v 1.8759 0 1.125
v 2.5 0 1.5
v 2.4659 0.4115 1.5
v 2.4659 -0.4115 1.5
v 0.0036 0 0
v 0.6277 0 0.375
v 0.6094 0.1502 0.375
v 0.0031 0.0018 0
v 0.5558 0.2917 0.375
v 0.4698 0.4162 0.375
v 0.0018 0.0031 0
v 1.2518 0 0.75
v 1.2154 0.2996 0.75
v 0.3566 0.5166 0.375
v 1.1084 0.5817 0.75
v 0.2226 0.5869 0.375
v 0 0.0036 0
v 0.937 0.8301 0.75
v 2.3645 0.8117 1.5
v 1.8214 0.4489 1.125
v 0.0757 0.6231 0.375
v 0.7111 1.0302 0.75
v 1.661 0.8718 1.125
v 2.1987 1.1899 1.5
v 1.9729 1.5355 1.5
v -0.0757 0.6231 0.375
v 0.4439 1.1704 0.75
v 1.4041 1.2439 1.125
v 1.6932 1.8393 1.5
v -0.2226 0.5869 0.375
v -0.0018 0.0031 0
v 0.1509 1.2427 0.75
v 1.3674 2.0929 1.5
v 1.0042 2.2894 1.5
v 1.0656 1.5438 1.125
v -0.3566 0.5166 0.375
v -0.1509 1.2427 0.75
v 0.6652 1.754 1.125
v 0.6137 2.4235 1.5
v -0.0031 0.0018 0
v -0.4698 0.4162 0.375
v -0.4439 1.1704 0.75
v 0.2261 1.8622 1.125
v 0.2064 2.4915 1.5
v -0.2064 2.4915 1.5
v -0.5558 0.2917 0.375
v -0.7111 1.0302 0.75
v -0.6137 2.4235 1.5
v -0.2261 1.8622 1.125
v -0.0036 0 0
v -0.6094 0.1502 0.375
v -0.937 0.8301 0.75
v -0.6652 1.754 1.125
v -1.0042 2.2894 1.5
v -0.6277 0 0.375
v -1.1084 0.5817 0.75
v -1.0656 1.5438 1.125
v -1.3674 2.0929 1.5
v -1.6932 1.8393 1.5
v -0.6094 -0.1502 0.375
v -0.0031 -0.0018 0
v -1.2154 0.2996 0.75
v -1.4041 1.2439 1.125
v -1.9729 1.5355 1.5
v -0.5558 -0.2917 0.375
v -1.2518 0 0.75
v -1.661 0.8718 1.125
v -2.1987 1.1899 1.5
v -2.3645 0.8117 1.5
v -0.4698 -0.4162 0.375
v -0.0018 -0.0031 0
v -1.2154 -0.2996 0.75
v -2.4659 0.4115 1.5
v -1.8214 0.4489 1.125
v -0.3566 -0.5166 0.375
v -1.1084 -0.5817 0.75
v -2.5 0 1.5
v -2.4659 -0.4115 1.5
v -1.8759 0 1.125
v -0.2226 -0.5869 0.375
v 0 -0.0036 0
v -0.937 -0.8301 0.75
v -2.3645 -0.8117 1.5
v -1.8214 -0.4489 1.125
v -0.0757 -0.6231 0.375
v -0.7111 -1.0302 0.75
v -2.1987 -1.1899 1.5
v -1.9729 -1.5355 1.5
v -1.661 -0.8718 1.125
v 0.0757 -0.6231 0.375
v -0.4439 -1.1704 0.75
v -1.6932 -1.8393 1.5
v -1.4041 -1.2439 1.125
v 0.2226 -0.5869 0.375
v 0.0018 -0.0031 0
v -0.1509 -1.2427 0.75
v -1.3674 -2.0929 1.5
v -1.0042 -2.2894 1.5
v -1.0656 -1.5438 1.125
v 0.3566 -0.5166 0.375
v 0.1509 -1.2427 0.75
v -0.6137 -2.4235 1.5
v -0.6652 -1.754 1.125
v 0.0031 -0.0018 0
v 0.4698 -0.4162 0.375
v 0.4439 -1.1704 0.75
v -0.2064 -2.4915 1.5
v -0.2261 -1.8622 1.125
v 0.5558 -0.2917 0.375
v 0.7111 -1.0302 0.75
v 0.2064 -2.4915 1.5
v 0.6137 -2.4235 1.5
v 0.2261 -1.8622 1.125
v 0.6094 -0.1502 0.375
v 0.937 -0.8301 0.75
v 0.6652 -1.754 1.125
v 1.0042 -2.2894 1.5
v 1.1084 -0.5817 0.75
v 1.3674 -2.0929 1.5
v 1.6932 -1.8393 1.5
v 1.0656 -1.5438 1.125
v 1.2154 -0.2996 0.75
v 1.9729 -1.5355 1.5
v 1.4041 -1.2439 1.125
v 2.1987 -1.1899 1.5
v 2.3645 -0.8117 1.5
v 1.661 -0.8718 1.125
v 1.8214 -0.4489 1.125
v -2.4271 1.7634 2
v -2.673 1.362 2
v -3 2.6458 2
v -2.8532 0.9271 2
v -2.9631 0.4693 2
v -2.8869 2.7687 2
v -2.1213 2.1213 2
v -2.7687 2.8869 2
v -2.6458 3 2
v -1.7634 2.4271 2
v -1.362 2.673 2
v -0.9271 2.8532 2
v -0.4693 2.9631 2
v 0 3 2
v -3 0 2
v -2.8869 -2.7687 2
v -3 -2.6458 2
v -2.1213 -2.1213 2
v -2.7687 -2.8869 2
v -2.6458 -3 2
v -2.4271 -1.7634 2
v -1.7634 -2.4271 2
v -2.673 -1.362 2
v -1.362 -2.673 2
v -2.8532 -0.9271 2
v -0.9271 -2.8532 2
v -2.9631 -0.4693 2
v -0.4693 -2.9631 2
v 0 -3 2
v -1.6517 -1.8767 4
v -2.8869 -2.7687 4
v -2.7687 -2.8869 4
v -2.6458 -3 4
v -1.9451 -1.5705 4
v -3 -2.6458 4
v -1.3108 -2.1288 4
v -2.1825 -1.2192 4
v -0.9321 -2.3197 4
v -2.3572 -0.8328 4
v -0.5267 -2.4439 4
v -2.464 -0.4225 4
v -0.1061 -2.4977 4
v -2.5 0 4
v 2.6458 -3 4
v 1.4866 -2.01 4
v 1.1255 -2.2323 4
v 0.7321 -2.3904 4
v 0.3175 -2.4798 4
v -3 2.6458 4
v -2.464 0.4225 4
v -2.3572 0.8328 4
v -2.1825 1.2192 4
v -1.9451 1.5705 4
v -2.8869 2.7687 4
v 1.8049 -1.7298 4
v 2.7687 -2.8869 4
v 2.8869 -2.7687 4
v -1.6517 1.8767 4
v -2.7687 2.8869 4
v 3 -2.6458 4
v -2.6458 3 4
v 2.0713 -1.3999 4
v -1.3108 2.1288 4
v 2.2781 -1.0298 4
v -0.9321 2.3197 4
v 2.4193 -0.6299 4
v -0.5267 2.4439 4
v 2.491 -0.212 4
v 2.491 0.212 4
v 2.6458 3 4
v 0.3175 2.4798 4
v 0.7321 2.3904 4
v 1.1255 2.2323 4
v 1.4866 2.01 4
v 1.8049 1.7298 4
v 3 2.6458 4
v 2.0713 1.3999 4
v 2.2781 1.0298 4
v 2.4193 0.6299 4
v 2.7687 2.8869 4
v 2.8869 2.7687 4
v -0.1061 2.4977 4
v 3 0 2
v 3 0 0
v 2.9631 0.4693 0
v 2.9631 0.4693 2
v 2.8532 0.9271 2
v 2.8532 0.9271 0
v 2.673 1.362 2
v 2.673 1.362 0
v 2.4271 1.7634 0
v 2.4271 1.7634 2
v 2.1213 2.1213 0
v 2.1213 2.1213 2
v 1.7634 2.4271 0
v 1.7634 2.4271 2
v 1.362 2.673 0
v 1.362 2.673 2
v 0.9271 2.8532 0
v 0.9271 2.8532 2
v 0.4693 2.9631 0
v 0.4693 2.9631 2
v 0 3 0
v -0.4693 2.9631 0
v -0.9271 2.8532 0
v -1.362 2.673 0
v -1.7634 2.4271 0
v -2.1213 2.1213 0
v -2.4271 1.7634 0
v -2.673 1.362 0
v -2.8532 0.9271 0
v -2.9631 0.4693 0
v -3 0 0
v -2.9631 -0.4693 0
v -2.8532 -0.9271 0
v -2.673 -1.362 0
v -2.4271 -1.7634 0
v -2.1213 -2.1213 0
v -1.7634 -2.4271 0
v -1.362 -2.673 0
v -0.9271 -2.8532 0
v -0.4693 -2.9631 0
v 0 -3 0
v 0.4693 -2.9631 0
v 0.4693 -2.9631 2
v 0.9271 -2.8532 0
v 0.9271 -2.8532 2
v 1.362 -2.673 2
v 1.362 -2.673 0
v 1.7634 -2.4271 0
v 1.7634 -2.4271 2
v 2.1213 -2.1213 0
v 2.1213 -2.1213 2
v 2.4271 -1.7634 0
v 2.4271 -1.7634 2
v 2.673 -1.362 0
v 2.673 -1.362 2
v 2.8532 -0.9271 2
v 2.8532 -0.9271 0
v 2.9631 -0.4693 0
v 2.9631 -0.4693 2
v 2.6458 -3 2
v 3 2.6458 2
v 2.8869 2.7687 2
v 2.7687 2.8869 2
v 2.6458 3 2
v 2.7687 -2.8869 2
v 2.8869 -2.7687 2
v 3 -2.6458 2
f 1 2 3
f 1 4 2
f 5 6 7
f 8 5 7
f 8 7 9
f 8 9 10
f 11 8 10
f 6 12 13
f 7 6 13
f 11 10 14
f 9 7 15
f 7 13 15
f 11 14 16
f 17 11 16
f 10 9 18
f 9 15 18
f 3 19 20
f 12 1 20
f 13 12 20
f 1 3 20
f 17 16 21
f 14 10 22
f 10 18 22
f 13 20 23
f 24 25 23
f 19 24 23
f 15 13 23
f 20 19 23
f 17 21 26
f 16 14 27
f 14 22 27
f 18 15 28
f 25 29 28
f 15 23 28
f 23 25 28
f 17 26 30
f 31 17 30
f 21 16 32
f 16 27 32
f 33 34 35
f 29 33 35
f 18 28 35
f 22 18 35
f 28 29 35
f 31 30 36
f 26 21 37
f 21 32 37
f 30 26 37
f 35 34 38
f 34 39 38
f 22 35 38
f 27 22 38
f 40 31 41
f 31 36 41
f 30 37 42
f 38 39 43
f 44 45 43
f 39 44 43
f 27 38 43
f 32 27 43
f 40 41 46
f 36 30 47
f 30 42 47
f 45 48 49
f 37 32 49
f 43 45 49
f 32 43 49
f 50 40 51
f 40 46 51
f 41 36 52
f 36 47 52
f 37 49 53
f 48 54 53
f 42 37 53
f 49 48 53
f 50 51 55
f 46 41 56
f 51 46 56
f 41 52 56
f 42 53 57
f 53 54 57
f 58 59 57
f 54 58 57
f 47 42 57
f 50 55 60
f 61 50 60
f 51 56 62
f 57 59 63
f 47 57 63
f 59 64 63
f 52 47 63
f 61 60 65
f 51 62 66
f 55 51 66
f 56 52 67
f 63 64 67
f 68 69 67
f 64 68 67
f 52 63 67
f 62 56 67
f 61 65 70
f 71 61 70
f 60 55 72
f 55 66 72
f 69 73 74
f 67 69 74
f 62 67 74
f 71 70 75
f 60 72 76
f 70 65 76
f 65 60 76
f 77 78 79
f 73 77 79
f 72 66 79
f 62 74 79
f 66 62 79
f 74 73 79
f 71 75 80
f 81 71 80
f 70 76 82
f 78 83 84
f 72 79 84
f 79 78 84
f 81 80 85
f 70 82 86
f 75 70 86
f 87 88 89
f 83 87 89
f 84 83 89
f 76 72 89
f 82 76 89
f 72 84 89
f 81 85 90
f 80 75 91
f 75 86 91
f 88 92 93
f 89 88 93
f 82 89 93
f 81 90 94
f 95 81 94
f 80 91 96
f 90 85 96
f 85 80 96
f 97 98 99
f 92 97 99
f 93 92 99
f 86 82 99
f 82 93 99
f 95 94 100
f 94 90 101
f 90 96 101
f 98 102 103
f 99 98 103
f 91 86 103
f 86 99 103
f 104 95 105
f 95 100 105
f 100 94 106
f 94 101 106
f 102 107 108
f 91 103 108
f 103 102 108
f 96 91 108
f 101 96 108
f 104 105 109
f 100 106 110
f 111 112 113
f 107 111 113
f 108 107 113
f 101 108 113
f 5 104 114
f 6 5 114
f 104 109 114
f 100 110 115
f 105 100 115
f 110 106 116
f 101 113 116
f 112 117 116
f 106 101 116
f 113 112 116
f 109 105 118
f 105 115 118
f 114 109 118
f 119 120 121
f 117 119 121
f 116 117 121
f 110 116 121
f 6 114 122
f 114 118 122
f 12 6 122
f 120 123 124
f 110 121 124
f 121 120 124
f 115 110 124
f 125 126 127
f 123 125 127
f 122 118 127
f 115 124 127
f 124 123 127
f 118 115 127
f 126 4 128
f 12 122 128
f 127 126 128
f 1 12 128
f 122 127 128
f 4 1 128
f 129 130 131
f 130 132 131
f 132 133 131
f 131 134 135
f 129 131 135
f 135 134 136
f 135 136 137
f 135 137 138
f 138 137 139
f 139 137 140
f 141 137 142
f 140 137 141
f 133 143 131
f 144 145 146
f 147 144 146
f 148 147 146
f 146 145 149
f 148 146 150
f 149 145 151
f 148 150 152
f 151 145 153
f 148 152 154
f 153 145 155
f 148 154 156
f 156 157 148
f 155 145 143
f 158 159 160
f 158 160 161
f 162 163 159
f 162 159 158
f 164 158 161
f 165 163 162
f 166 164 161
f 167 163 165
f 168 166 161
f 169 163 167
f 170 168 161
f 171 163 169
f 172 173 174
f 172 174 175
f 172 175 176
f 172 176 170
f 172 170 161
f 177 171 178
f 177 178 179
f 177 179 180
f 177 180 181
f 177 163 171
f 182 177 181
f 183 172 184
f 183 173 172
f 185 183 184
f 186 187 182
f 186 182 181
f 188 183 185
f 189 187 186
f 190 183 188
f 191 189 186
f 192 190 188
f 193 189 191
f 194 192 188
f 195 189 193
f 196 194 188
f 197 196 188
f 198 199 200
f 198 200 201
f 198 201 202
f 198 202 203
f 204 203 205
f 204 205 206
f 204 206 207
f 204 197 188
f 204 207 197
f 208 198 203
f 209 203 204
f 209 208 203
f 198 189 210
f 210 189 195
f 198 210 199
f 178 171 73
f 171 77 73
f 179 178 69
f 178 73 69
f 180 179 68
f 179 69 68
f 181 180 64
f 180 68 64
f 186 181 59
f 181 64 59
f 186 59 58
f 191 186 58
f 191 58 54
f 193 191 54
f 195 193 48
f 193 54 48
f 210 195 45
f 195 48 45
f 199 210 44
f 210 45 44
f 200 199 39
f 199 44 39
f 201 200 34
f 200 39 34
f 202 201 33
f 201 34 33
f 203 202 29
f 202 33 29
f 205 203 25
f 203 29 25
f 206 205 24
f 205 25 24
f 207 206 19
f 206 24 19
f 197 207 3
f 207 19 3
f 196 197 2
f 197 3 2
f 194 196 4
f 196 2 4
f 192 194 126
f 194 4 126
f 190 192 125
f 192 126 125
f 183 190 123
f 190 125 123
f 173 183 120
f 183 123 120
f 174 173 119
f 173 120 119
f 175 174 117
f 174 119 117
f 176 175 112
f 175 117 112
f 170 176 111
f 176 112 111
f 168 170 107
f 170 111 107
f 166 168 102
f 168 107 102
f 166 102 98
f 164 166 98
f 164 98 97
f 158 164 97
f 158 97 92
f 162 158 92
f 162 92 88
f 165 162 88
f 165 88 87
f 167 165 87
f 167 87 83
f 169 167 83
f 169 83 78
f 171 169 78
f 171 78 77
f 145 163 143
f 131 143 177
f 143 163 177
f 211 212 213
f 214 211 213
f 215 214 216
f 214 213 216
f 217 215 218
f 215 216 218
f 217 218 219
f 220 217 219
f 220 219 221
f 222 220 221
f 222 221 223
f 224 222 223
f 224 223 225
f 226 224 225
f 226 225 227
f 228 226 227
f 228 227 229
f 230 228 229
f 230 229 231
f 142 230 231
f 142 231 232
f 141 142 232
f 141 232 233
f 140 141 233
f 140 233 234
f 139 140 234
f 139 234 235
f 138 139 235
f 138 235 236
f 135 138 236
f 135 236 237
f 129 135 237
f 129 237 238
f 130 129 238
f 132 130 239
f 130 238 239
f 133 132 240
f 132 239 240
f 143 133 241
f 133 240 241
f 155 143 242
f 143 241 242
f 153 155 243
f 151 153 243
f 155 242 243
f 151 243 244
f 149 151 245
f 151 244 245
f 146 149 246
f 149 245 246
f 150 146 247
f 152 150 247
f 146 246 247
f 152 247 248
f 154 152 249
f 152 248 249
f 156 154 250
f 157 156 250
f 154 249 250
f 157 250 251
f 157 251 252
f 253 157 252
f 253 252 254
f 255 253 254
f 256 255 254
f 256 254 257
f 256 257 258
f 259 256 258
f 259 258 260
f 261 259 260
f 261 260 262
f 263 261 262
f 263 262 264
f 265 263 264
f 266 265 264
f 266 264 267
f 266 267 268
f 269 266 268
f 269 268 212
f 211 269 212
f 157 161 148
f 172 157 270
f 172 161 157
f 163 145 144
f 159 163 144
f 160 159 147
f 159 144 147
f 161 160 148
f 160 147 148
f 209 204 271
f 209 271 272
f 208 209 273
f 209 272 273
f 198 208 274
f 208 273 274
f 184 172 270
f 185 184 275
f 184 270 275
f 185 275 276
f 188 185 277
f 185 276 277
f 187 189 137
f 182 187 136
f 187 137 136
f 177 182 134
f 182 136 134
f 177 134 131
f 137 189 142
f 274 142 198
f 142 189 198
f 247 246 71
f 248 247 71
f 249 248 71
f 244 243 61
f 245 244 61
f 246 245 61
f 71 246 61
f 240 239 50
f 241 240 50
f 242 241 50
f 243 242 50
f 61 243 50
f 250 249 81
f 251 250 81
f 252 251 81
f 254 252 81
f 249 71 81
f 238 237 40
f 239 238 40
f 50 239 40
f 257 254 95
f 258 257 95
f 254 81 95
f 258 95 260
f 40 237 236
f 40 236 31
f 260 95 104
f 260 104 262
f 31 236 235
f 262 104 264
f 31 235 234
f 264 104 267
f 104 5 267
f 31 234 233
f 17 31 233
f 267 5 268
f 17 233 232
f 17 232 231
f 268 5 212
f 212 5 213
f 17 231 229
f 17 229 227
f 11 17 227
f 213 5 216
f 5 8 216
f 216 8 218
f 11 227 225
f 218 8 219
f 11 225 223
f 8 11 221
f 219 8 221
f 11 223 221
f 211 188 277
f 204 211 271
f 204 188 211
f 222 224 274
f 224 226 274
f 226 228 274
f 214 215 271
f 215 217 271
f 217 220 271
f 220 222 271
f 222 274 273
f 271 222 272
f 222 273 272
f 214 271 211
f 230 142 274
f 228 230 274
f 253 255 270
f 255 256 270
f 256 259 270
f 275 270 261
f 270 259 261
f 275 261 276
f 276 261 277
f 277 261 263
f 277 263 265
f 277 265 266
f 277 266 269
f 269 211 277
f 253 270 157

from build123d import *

# Parameters (mm, degrees)
F0_R     = 3
F1_DEPTH = 2
F2_R     = 4
F3_DEPTH = 2
F5_W     = 6
F5_H     = 6
F6_DEPTH = 25
F7_D     = 5
F7_DEPTH = 2.5
F7_TIP   = 1.5021515476


with BuildPart() as f1:
    # F0 (on Top) → F1 (new body)
    with BuildSketch(Plane.XY):
        Circle(F0_R)
    extrude(amount=F1_DEPTH)

    # F2 (on face) → F3 (join)
    with BuildSketch(Plane.XY.offset(2)):
        Circle(F2_R)
    extrude(amount=F3_DEPTH)

    # F5 (on face) → F6 (intersect)
    with BuildSketch(Plane.XY.offset(4)):
        Rectangle(F5_W, F5_H)
    extrude(amount=-F6_DEPTH, mode=Mode.INTERSECT)

    # F7
    with Locations(Plane.XY.offset(4)):
        with Locations((0, 0)):
            Hole(F7_D / 2, depth=F7_DEPTH)
            with Locations((0, 0, -(F7_DEPTH + F7_TIP / 2))):  # 118° drill point
                Cone(0, F7_D / 2, F7_TIP, mode=Mode.SUBTRACT)


solid = f1.part
